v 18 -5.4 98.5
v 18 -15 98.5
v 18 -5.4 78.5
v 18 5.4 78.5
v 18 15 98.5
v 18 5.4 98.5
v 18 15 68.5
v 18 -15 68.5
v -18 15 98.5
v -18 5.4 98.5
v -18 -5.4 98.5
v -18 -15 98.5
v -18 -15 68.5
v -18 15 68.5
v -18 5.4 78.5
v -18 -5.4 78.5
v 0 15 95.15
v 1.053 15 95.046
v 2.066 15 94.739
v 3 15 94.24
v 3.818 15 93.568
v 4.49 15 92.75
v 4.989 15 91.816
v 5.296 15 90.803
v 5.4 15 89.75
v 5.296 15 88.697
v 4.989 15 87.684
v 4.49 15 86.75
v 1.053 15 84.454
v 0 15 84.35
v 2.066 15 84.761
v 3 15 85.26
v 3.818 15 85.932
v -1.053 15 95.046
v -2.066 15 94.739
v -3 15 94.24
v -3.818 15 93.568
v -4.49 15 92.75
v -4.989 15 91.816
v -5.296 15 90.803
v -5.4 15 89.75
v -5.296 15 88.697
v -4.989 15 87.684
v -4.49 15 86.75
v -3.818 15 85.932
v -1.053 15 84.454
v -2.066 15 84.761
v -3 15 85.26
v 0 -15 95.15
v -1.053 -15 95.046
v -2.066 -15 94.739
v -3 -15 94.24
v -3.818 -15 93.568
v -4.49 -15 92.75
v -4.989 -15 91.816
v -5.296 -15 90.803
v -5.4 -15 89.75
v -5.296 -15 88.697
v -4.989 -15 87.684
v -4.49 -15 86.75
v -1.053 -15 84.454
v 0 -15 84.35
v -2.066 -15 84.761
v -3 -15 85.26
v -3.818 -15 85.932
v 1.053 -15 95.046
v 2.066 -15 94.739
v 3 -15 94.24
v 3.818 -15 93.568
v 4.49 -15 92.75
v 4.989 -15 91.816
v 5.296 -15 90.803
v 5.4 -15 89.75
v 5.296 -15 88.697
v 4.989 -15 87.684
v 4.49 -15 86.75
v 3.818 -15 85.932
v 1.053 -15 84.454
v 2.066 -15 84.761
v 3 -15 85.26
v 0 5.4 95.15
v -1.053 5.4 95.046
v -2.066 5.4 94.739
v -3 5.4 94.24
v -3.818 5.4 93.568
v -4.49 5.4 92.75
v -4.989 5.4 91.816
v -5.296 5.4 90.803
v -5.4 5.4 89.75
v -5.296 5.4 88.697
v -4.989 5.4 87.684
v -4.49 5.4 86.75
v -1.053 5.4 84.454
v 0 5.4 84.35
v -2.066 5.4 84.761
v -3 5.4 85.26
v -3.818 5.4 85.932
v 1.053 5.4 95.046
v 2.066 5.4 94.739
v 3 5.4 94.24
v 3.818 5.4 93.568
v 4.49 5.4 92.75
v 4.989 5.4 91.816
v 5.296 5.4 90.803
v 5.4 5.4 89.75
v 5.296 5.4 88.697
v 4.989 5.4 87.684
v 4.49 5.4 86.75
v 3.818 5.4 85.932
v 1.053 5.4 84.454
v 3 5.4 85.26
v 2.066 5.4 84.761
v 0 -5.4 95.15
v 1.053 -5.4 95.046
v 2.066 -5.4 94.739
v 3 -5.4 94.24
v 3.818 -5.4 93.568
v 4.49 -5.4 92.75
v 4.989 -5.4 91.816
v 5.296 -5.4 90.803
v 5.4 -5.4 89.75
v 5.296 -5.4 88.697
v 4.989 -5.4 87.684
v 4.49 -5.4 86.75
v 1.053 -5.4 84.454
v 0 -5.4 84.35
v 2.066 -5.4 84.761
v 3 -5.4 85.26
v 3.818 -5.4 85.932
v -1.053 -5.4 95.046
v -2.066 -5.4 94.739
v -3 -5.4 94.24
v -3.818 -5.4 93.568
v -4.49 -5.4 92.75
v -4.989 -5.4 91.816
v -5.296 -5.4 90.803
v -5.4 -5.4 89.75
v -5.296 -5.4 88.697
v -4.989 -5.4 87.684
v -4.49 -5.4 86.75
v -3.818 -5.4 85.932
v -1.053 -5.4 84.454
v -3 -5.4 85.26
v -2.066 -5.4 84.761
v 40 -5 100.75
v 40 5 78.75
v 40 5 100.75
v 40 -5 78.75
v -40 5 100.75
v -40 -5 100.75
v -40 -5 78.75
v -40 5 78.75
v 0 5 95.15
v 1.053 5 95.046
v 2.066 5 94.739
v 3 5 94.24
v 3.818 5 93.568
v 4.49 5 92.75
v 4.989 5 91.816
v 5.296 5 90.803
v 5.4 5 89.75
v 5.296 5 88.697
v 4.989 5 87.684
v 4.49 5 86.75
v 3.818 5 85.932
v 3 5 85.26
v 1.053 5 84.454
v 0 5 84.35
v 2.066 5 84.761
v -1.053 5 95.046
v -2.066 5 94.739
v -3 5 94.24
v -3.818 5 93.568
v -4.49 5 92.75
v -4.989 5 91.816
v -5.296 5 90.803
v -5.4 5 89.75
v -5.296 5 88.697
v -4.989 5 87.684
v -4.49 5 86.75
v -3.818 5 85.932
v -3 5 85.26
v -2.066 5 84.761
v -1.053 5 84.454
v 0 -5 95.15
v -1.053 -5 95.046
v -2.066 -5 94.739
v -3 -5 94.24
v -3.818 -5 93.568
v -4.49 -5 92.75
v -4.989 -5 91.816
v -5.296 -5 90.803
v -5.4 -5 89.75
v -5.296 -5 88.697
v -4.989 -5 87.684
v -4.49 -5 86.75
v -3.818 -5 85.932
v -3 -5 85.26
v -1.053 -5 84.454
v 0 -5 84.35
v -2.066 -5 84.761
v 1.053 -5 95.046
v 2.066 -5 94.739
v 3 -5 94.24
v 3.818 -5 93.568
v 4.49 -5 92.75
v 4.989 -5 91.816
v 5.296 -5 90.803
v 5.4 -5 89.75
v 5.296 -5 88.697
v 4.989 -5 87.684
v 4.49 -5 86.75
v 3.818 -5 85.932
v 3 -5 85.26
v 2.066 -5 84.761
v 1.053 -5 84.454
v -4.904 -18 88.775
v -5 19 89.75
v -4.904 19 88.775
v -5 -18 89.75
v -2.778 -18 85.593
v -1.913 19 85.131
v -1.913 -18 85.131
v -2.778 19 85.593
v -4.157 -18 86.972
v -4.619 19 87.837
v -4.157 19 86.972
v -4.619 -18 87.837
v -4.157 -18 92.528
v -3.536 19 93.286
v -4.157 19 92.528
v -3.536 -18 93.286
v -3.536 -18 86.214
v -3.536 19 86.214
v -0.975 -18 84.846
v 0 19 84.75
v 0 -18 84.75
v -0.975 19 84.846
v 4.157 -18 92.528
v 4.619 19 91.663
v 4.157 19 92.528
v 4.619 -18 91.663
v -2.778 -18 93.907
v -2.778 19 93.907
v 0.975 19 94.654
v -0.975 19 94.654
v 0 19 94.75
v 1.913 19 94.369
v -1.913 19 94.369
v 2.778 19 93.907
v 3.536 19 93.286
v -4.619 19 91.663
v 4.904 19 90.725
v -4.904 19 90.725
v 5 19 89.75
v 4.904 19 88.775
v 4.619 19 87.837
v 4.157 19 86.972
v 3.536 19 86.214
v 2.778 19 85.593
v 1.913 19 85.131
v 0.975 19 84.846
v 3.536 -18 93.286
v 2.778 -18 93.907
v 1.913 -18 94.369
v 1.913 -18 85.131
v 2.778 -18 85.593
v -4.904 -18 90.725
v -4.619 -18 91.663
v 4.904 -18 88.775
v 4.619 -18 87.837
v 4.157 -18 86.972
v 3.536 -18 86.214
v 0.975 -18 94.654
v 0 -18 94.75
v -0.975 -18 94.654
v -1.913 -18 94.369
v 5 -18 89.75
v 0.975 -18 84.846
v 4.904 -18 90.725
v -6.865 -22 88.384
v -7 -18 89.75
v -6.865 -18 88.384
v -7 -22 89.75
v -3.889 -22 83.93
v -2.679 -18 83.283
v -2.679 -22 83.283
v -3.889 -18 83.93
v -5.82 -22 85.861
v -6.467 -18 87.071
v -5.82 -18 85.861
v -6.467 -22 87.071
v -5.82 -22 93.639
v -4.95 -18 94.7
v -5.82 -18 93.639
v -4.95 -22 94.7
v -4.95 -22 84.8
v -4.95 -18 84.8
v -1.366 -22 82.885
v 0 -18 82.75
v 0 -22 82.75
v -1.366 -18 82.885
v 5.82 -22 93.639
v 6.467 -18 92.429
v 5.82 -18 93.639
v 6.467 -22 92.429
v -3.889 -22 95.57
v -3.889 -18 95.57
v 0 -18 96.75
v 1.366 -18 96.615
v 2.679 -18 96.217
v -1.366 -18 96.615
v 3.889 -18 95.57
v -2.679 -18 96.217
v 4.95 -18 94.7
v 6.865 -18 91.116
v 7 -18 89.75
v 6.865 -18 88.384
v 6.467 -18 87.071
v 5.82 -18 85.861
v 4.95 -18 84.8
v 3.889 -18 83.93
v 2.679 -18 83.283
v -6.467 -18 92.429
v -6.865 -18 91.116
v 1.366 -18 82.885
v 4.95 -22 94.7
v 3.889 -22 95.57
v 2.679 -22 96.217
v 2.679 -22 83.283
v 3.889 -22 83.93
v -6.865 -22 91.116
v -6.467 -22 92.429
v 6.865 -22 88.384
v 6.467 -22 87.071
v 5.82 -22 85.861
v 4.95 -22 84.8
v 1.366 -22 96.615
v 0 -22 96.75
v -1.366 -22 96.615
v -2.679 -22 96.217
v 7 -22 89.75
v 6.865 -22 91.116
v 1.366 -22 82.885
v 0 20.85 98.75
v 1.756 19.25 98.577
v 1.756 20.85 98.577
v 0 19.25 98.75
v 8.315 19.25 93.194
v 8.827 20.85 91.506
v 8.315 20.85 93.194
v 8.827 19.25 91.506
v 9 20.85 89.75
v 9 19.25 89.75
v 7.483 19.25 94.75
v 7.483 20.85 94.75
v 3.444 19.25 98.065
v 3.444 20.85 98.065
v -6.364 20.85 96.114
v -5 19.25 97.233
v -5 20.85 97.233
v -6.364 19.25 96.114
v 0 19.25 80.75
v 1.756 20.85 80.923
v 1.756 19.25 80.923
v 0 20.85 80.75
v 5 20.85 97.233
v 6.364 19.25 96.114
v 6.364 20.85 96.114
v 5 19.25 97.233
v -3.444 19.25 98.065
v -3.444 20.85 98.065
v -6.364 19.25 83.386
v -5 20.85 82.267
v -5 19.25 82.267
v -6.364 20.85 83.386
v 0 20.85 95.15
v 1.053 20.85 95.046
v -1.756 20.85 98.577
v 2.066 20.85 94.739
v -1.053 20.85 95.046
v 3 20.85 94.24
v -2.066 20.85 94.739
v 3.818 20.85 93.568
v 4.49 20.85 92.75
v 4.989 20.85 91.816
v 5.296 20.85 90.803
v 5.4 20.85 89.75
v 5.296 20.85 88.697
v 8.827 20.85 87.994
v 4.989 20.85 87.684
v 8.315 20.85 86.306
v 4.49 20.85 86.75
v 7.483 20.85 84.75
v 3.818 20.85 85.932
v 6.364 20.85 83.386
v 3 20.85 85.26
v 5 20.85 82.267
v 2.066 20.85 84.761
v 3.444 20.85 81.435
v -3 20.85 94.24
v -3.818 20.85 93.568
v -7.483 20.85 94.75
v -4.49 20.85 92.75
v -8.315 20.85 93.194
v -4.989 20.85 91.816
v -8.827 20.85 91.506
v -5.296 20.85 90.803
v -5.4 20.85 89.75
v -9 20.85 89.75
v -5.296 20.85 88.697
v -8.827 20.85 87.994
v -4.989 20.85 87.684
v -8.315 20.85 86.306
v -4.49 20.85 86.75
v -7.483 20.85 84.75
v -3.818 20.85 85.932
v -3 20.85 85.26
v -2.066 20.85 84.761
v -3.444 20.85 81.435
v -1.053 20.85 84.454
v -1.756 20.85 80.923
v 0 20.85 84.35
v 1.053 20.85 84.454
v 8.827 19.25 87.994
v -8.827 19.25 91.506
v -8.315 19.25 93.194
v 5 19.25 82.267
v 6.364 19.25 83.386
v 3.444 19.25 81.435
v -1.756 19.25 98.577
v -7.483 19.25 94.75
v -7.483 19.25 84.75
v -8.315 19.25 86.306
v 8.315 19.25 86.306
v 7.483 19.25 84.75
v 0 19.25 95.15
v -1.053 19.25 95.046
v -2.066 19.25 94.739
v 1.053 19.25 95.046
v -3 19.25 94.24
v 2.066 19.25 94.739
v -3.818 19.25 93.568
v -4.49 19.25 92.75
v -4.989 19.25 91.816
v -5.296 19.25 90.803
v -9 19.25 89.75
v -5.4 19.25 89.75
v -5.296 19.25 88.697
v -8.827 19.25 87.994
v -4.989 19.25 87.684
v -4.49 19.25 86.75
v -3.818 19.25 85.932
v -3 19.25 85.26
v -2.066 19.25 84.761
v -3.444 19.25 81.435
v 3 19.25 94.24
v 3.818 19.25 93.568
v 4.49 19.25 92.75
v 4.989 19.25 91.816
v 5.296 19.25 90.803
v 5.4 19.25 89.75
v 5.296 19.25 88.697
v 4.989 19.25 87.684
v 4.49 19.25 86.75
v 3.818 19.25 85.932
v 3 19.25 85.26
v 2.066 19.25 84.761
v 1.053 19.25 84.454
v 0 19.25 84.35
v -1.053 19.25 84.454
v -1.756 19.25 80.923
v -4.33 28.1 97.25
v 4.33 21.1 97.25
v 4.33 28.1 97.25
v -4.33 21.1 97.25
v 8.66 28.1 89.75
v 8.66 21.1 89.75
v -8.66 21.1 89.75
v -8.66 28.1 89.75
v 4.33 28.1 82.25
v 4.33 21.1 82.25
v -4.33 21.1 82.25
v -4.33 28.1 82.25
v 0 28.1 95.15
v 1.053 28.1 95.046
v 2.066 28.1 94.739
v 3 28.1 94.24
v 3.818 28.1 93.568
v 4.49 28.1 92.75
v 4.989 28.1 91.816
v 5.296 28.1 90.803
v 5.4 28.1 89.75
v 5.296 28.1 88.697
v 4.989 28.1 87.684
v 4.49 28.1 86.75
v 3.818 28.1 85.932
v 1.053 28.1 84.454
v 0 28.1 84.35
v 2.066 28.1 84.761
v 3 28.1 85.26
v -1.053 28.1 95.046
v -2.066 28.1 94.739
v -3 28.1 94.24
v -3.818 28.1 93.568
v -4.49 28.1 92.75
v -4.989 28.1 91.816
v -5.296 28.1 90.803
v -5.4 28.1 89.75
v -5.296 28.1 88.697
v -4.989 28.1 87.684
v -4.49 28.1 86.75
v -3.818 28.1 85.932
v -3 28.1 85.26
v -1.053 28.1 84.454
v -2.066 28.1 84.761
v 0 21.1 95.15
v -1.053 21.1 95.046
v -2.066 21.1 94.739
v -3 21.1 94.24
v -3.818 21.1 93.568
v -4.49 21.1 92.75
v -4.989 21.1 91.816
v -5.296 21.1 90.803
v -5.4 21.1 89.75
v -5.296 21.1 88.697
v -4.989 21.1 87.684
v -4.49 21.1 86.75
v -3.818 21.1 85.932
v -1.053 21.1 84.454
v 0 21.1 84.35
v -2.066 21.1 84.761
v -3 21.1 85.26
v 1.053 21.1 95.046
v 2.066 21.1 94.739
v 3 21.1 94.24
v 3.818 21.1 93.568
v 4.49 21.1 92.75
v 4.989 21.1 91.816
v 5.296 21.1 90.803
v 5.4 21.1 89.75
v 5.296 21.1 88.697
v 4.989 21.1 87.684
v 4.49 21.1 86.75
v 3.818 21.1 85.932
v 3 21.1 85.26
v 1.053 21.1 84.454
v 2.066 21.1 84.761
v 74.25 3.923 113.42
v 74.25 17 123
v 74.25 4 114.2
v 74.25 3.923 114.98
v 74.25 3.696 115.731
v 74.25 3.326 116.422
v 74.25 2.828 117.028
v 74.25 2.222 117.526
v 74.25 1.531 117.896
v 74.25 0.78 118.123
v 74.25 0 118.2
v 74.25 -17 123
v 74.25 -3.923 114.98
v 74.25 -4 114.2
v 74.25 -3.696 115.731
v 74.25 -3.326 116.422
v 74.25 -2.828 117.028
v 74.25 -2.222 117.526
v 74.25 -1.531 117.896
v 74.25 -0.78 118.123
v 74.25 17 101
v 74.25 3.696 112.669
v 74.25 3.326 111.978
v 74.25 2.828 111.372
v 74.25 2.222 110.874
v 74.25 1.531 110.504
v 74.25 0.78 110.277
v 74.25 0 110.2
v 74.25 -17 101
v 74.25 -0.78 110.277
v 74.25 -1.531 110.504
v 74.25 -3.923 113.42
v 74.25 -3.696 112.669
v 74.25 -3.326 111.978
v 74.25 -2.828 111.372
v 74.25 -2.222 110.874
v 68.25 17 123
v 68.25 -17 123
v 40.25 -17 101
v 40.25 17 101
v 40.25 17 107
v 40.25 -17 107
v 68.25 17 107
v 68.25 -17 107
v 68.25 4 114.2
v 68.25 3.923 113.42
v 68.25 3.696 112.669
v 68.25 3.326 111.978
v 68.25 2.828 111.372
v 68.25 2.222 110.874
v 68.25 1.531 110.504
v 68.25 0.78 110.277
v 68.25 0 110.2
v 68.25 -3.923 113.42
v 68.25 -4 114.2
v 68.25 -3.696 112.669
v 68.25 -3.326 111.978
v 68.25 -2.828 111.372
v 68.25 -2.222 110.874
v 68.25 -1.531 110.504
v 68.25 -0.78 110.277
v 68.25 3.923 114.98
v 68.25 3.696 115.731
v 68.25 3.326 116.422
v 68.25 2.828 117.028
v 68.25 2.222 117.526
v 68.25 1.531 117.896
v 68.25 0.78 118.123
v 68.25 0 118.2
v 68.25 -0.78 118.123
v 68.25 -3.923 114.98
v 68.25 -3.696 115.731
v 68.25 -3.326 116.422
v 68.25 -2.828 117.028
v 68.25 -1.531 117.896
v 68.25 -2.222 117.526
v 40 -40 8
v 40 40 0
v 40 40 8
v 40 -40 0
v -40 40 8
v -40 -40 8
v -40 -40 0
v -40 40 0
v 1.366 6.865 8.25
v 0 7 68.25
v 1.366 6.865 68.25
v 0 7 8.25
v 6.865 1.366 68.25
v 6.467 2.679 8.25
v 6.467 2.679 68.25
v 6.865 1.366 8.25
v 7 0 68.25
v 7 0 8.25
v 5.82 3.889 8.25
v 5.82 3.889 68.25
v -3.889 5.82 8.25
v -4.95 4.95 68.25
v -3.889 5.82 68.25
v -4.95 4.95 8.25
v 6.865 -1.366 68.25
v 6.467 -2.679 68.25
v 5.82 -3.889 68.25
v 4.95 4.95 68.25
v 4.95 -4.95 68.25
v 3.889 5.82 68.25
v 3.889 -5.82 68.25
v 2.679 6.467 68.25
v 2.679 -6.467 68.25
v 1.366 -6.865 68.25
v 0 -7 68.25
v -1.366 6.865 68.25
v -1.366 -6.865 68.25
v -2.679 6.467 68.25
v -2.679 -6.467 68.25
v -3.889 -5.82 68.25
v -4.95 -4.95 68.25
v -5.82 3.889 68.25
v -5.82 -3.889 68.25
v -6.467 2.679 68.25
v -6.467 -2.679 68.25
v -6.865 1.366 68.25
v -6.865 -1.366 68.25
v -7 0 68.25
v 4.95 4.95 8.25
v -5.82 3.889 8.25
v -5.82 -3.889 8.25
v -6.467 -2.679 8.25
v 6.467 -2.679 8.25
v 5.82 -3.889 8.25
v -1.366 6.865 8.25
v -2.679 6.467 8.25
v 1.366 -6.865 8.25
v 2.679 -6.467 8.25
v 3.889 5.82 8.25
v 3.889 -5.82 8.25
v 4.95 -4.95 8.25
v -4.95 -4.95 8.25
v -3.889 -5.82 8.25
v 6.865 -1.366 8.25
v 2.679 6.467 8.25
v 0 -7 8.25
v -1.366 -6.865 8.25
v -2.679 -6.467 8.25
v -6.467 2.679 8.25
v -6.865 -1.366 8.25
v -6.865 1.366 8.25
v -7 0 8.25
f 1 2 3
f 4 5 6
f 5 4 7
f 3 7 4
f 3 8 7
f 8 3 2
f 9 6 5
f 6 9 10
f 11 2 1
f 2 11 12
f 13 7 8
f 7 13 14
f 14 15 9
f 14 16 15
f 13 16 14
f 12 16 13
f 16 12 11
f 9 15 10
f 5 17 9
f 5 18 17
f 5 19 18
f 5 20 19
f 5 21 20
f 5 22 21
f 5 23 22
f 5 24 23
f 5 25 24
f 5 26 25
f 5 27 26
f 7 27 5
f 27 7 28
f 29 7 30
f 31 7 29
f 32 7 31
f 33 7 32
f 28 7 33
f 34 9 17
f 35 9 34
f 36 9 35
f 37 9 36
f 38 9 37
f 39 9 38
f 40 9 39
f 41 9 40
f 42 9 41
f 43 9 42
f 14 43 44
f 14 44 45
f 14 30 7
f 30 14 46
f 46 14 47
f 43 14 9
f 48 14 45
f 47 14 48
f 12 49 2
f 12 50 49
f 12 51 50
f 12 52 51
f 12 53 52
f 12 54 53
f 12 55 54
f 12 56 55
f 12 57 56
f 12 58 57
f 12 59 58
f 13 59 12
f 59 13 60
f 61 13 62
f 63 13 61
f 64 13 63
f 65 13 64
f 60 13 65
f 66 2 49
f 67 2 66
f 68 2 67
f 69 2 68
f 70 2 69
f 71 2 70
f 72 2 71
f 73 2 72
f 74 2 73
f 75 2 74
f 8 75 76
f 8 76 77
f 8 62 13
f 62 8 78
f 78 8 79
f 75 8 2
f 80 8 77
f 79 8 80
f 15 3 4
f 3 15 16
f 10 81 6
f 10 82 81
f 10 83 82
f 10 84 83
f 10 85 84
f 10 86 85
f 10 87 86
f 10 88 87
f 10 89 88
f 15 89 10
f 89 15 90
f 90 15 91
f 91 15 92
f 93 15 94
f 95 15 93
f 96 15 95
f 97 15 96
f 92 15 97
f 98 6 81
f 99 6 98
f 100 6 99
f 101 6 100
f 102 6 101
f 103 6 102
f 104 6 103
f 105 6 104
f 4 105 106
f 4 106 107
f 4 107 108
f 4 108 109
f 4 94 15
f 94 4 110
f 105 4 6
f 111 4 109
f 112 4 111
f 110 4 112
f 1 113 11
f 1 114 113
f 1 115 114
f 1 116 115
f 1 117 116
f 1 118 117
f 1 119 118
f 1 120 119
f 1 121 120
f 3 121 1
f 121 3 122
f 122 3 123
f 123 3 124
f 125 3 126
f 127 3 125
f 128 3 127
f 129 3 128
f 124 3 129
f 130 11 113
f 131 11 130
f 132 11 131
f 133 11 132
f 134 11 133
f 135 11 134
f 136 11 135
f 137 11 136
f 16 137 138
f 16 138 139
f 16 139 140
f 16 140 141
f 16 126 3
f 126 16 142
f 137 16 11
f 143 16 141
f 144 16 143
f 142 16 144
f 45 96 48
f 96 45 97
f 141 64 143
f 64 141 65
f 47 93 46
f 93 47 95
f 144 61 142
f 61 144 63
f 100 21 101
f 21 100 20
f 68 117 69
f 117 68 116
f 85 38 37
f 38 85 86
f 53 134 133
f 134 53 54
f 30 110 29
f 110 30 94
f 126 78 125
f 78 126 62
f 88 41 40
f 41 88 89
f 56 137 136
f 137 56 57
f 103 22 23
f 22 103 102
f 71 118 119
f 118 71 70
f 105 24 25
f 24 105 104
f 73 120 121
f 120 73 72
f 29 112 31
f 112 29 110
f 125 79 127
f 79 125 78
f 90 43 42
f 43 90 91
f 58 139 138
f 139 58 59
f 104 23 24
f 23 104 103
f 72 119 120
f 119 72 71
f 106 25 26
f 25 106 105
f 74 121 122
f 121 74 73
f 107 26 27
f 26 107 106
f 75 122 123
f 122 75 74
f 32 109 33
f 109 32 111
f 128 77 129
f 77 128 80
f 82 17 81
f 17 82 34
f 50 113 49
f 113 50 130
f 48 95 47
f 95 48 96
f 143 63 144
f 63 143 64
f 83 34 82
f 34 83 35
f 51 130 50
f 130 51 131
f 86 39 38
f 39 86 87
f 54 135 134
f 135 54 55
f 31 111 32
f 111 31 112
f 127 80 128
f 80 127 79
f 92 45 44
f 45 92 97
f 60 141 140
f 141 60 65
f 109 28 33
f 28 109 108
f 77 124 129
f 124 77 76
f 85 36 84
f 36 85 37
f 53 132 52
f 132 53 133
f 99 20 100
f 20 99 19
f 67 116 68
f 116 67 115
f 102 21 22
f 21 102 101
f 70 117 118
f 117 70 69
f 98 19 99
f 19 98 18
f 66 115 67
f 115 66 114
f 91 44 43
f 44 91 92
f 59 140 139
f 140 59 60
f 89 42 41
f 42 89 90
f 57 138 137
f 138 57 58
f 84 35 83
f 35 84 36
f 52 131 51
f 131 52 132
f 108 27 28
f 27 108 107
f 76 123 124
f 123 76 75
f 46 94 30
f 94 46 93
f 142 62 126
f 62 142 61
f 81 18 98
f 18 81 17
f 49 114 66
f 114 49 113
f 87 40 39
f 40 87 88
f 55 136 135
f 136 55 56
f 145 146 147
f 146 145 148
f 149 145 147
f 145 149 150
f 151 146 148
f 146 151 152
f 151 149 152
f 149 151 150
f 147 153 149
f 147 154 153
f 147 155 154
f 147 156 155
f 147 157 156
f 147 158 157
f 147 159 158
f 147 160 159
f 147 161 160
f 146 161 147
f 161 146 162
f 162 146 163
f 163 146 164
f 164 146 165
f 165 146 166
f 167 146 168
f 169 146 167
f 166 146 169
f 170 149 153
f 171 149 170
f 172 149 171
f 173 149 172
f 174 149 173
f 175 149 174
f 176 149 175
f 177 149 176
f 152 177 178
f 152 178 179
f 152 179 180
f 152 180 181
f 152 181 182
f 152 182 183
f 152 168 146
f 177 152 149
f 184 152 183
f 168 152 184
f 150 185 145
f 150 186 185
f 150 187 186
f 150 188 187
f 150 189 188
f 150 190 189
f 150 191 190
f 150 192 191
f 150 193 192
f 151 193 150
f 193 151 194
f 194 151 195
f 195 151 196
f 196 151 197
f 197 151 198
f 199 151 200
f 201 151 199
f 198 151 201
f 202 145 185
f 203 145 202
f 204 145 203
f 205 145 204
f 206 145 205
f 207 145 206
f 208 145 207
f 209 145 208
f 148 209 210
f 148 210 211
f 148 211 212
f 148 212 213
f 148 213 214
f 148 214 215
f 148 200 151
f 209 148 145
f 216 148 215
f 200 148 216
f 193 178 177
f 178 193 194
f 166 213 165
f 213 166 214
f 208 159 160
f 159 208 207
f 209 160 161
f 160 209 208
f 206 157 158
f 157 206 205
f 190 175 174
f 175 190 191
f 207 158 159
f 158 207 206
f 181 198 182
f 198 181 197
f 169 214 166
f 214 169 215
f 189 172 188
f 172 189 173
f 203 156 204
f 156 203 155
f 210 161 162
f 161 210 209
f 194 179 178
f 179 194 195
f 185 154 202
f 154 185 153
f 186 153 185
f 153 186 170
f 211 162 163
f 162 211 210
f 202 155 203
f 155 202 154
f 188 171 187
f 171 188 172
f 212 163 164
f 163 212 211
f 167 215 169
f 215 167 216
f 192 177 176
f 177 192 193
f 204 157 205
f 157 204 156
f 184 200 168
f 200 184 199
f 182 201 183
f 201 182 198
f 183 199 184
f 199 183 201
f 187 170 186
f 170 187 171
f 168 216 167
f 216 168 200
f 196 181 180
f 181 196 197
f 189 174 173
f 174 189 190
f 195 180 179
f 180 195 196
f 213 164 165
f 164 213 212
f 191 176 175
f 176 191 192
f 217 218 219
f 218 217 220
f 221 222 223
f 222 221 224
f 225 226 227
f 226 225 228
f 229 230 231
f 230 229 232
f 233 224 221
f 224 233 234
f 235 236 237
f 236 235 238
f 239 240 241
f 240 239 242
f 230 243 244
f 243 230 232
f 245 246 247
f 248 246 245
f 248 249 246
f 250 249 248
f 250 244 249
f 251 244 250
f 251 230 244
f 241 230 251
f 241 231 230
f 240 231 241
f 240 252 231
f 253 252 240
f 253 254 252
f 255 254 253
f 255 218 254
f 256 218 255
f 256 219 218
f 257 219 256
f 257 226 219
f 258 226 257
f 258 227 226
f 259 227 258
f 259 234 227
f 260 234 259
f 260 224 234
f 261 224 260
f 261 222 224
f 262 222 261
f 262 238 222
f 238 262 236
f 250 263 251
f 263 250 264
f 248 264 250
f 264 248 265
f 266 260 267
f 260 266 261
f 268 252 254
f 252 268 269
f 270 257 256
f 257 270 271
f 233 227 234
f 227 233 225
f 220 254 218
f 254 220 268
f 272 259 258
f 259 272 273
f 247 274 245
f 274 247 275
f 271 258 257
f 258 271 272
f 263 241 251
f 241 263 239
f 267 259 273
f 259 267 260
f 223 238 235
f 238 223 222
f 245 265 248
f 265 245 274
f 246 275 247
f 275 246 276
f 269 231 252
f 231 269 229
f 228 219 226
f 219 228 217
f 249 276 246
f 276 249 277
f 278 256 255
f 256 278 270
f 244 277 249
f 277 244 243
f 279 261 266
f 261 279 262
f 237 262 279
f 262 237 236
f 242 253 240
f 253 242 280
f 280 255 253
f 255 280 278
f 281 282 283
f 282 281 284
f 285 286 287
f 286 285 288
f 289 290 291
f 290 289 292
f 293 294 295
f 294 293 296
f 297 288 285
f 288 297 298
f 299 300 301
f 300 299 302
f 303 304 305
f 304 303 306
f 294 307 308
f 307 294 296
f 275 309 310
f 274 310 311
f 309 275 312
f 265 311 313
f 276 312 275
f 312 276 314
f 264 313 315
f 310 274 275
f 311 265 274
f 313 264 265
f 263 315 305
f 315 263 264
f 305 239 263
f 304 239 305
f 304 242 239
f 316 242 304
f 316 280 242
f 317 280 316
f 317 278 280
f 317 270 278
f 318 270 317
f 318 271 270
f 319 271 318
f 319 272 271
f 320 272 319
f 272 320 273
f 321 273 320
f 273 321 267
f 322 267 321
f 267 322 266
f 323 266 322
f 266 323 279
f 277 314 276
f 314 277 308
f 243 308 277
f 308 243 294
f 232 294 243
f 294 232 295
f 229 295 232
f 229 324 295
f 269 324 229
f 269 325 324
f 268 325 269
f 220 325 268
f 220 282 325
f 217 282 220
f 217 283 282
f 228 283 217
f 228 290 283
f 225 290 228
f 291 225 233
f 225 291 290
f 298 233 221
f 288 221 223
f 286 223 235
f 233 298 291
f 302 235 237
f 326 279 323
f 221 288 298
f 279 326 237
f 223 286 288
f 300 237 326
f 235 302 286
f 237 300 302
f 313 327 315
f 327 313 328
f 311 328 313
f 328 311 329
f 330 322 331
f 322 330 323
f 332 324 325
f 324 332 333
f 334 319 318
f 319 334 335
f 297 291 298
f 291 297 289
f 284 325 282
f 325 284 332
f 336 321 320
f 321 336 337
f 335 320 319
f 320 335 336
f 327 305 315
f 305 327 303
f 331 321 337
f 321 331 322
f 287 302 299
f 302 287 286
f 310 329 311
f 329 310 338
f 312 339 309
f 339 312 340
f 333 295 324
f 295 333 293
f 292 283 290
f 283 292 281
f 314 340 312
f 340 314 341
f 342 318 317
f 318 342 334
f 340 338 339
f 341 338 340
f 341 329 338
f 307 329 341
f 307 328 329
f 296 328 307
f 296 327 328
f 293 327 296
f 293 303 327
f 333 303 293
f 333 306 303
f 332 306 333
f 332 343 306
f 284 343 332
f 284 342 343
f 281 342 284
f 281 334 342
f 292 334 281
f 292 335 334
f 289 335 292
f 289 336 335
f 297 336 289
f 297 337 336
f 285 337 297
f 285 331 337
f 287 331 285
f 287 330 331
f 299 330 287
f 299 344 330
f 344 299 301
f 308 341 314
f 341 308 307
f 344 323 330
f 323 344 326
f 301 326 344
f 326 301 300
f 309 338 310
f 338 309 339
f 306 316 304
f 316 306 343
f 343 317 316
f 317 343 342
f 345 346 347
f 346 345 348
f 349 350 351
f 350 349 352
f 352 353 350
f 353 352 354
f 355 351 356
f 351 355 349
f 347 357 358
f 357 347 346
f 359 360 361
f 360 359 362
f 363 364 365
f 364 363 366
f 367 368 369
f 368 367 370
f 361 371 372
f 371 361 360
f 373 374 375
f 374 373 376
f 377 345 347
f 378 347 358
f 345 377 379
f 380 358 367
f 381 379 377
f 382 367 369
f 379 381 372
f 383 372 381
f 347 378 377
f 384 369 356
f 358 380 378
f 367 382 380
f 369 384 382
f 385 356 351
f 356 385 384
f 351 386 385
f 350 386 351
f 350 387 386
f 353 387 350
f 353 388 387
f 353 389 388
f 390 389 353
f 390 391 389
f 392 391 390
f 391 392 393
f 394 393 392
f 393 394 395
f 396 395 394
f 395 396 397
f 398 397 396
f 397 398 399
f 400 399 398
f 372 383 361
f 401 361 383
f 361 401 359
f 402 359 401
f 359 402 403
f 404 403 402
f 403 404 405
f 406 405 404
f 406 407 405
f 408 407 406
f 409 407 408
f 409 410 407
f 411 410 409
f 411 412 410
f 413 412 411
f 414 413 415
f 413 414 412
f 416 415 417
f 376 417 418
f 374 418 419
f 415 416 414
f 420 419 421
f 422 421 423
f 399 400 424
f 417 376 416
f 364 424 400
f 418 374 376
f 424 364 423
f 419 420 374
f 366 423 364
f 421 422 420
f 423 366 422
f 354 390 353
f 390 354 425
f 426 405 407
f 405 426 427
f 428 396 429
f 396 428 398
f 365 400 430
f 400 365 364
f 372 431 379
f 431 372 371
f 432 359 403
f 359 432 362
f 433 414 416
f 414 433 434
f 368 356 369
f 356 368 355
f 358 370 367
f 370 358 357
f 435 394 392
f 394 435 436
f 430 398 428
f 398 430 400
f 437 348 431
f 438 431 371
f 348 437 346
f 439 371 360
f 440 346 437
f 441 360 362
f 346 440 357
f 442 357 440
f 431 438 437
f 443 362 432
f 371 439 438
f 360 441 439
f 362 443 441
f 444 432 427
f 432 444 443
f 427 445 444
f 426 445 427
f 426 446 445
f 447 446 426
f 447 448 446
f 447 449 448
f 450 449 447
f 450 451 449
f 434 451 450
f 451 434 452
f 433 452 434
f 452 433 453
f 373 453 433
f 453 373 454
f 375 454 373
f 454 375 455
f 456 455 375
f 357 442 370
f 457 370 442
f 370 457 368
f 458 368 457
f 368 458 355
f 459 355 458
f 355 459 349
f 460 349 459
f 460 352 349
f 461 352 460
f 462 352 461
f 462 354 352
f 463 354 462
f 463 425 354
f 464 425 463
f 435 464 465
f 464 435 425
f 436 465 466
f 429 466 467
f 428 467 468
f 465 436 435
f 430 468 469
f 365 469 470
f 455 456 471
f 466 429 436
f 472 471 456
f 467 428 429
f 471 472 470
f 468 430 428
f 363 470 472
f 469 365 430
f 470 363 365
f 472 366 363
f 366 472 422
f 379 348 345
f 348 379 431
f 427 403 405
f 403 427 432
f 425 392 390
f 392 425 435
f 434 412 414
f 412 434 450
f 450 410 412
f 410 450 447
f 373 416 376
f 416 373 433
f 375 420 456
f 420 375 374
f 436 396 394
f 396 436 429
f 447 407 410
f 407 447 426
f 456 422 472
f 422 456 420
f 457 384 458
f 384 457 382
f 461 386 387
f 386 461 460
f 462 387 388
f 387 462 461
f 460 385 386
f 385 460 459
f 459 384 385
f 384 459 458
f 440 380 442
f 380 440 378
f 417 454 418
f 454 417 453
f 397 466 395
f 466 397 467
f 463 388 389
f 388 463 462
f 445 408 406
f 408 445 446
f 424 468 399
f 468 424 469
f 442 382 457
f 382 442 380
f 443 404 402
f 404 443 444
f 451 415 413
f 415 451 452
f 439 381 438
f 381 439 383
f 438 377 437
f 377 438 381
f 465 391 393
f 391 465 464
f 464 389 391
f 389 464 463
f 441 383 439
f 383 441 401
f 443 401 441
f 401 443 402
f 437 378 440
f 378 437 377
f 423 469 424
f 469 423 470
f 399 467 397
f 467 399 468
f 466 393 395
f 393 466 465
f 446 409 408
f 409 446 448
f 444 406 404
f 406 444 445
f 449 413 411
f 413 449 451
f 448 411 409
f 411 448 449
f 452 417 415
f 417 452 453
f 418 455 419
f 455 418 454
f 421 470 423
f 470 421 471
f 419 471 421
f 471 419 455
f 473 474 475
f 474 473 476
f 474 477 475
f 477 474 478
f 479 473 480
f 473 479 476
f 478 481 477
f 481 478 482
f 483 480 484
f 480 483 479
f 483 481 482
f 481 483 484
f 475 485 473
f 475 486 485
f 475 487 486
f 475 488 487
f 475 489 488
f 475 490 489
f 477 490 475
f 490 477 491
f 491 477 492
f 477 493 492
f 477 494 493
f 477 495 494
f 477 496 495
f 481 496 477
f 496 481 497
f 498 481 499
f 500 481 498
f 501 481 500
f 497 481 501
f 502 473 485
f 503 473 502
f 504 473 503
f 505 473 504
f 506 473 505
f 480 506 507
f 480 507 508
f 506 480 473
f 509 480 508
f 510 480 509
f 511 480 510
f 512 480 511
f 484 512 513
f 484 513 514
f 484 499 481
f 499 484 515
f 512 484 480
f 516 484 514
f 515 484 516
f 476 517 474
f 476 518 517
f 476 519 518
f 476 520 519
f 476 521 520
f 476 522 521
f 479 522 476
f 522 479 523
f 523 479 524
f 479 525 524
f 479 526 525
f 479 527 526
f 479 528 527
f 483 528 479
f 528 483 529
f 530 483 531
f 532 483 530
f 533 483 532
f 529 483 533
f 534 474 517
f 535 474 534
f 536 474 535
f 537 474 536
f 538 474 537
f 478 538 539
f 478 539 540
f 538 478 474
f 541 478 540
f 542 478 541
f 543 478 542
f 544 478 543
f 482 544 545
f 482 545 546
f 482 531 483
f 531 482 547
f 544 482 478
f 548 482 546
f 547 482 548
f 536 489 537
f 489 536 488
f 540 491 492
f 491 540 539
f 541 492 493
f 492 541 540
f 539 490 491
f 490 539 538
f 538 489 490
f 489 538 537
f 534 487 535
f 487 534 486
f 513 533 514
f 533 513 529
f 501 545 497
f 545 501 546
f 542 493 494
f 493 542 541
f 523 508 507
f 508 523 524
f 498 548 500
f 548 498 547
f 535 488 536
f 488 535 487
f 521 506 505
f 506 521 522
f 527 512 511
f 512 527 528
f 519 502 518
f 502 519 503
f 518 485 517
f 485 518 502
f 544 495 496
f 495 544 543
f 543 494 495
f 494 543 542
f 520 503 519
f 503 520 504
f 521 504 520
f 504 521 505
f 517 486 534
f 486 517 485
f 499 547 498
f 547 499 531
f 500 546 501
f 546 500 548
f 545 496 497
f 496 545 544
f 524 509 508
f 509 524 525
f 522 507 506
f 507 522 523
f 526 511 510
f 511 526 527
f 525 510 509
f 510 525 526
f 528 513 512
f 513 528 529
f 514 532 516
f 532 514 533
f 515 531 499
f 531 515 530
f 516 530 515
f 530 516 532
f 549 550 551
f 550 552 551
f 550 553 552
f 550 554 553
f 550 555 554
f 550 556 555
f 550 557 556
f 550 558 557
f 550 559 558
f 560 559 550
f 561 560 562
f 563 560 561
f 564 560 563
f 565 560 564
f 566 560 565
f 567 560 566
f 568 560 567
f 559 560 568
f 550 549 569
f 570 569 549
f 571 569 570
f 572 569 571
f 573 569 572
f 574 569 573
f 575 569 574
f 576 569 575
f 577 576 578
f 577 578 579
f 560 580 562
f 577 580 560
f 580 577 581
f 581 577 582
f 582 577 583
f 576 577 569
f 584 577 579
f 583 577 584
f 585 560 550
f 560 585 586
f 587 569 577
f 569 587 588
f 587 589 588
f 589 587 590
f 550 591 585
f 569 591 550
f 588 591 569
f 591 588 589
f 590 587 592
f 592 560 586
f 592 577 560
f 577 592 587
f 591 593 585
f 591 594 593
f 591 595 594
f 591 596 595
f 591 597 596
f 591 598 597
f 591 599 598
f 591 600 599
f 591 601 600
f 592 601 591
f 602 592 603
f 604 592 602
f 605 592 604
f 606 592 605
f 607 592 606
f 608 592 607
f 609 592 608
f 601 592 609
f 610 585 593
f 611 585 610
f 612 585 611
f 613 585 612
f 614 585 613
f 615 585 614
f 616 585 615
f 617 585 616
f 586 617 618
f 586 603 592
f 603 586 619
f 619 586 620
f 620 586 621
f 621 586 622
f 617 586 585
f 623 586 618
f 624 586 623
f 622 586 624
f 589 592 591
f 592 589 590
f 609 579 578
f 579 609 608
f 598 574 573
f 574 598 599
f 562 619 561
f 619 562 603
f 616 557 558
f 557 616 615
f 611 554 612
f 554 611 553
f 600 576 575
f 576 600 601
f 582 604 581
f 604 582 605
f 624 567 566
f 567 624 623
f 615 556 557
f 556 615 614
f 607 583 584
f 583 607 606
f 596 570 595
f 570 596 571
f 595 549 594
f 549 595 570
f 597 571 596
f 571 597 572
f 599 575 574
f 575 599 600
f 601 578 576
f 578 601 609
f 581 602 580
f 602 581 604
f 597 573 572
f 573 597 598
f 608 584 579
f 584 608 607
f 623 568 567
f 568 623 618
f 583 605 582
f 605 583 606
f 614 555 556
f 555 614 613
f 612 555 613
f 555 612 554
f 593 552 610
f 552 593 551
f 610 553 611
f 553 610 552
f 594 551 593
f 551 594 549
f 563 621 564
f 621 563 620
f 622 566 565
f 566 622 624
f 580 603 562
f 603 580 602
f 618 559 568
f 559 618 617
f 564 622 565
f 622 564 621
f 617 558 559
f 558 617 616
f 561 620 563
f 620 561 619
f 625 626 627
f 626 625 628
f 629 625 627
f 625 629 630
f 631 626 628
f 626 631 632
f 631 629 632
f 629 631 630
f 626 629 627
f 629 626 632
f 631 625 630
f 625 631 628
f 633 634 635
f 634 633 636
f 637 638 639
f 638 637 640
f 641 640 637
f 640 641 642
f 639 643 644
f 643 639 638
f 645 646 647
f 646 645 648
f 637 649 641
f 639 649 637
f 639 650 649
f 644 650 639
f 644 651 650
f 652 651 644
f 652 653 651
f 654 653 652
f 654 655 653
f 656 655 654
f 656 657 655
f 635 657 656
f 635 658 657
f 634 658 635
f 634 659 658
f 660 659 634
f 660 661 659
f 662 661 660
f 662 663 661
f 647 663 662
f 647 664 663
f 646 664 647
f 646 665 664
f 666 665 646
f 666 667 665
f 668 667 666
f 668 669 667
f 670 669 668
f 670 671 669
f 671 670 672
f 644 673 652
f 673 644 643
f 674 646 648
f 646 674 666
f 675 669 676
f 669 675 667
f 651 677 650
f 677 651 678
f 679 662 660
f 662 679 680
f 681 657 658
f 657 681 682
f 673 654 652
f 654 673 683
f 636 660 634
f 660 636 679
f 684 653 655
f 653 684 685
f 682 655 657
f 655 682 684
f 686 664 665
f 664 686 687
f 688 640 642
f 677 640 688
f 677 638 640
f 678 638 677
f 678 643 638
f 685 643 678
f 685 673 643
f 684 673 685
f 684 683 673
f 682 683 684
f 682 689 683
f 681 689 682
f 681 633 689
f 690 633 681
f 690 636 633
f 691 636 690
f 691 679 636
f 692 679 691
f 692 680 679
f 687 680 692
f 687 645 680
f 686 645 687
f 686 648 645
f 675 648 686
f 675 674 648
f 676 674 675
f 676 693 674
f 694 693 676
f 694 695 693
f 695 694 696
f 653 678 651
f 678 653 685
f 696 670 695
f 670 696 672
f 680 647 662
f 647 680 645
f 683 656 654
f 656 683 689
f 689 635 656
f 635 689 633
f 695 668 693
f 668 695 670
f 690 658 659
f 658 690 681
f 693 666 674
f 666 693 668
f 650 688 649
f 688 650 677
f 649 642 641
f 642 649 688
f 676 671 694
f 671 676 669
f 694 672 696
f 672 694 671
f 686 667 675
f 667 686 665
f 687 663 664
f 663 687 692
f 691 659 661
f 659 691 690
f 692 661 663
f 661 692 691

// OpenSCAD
$fn = 32;

// ------------------------------------------------------------------------
// Lamp arm: column d14 x 60 mm, arm 80 mm
// Every part is its own module, assembly() places every instance.
// ------------------------------------------------------------------------

// --- part 1 ---
module lamp_base() {
  difference() {
    translate([-40, -40, 0]) cube([80, 80, 8]);
  }
}

// --- part 2 ---
module lamp_column() {
  cylinder(h = 60, d = 14);
}

// --- part 3 ---
module head_fork() {
  difference() {
    translate([-18, -15, 0]) cube([36, 30, 30]);
    translate([-19, -5.4, 10]) cube([38, 10.8, 21]);
    translate([0, 0, 21.25]) rotate([90, 0, 0]) cylinder(h = 32, d = 10.8, center = true);
  }
}

// --- part 4 ---
module lamp_arm() {
  difference() {
    translate([-40, -5, 0]) cube([80, 10, 22]);
    translate([0, 0, 11]) rotate([90, 0, 0]) cylinder(h = 12, d = 10.8, center = true);
  }
}

// --- part 5 ---
module arm_pin() {
  rotate([0, 90, 0]) cylinder(h = 38, d = 10, center = true);
  translate([-22, 0, 0]) rotate([0, 90, 0]) cylinder(h = 4, d = 14);
}

// --- part 6 ---
module arm_washer() {
  difference() {
      translate([0, 0, 0]) cylinder(h = 1.6, d = 18);
      translate([0, 0, -1]) cylinder(h = 3.6, d = 10.8);
    }
}

// --- part 7 ---
module arm_nut() {
  difference() {
    linear_extrude(height = 7) polygon(points = [[8.66, 0], [4.33, 7.5], [-4.33, 7.5], [-8.66, 0], [-4.33, -7.5], [4.33, -7.5]]);
    translate([0, 0, -1]) cylinder(h = 9, d = 10.8);
  }
}

// --- part 8 ---
module shade_bracket() {
  difference() {
    translate([-17, -17, 0]) cube([34, 34, 22]);
    translate([-18, -18, 6]) cube([29, 36, 17]);
    translate([14, 0, 13.2]) rotate([0, 90, 0]) cylinder(h = 8, d = 8, center = true);
  }
}

// --- assembly ---
module assembly() {
  color([0.80, 0.24, 0.20]) translate([0, 0, 0]) rotate([0, 0, 0]) lamp_base();
  color([0.20, 0.45, 0.75]) translate([0, 0, 8.25]) rotate([0, 0, 0]) lamp_column();
  color([0.25, 0.62, 0.32]) translate([0, 0, 68.5]) rotate([0, 0, 0]) head_fork();
  color([0.92, 0.70, 0.18]) translate([0, 0, 78.75]) rotate([0, 0, 0]) lamp_arm();
  color([0.58, 0.35, 0.70]) translate([0, 0, 89.75]) rotate([0, 0, 90]) arm_pin();
  color([0.16, 0.66, 0.66]) translate([0, 20.85, 89.75]) rotate([90, 0, 0]) arm_washer();
  color([0.85, 0.48, 0.18]) translate([0, 28.1, 89.75]) rotate([90, 0, 0]) arm_nut();
  color([0.55, 0.60, 0.65]) translate([57.25, 0, 101]) rotate([0, 0, 0]) shade_bracket();
}

assembly();
